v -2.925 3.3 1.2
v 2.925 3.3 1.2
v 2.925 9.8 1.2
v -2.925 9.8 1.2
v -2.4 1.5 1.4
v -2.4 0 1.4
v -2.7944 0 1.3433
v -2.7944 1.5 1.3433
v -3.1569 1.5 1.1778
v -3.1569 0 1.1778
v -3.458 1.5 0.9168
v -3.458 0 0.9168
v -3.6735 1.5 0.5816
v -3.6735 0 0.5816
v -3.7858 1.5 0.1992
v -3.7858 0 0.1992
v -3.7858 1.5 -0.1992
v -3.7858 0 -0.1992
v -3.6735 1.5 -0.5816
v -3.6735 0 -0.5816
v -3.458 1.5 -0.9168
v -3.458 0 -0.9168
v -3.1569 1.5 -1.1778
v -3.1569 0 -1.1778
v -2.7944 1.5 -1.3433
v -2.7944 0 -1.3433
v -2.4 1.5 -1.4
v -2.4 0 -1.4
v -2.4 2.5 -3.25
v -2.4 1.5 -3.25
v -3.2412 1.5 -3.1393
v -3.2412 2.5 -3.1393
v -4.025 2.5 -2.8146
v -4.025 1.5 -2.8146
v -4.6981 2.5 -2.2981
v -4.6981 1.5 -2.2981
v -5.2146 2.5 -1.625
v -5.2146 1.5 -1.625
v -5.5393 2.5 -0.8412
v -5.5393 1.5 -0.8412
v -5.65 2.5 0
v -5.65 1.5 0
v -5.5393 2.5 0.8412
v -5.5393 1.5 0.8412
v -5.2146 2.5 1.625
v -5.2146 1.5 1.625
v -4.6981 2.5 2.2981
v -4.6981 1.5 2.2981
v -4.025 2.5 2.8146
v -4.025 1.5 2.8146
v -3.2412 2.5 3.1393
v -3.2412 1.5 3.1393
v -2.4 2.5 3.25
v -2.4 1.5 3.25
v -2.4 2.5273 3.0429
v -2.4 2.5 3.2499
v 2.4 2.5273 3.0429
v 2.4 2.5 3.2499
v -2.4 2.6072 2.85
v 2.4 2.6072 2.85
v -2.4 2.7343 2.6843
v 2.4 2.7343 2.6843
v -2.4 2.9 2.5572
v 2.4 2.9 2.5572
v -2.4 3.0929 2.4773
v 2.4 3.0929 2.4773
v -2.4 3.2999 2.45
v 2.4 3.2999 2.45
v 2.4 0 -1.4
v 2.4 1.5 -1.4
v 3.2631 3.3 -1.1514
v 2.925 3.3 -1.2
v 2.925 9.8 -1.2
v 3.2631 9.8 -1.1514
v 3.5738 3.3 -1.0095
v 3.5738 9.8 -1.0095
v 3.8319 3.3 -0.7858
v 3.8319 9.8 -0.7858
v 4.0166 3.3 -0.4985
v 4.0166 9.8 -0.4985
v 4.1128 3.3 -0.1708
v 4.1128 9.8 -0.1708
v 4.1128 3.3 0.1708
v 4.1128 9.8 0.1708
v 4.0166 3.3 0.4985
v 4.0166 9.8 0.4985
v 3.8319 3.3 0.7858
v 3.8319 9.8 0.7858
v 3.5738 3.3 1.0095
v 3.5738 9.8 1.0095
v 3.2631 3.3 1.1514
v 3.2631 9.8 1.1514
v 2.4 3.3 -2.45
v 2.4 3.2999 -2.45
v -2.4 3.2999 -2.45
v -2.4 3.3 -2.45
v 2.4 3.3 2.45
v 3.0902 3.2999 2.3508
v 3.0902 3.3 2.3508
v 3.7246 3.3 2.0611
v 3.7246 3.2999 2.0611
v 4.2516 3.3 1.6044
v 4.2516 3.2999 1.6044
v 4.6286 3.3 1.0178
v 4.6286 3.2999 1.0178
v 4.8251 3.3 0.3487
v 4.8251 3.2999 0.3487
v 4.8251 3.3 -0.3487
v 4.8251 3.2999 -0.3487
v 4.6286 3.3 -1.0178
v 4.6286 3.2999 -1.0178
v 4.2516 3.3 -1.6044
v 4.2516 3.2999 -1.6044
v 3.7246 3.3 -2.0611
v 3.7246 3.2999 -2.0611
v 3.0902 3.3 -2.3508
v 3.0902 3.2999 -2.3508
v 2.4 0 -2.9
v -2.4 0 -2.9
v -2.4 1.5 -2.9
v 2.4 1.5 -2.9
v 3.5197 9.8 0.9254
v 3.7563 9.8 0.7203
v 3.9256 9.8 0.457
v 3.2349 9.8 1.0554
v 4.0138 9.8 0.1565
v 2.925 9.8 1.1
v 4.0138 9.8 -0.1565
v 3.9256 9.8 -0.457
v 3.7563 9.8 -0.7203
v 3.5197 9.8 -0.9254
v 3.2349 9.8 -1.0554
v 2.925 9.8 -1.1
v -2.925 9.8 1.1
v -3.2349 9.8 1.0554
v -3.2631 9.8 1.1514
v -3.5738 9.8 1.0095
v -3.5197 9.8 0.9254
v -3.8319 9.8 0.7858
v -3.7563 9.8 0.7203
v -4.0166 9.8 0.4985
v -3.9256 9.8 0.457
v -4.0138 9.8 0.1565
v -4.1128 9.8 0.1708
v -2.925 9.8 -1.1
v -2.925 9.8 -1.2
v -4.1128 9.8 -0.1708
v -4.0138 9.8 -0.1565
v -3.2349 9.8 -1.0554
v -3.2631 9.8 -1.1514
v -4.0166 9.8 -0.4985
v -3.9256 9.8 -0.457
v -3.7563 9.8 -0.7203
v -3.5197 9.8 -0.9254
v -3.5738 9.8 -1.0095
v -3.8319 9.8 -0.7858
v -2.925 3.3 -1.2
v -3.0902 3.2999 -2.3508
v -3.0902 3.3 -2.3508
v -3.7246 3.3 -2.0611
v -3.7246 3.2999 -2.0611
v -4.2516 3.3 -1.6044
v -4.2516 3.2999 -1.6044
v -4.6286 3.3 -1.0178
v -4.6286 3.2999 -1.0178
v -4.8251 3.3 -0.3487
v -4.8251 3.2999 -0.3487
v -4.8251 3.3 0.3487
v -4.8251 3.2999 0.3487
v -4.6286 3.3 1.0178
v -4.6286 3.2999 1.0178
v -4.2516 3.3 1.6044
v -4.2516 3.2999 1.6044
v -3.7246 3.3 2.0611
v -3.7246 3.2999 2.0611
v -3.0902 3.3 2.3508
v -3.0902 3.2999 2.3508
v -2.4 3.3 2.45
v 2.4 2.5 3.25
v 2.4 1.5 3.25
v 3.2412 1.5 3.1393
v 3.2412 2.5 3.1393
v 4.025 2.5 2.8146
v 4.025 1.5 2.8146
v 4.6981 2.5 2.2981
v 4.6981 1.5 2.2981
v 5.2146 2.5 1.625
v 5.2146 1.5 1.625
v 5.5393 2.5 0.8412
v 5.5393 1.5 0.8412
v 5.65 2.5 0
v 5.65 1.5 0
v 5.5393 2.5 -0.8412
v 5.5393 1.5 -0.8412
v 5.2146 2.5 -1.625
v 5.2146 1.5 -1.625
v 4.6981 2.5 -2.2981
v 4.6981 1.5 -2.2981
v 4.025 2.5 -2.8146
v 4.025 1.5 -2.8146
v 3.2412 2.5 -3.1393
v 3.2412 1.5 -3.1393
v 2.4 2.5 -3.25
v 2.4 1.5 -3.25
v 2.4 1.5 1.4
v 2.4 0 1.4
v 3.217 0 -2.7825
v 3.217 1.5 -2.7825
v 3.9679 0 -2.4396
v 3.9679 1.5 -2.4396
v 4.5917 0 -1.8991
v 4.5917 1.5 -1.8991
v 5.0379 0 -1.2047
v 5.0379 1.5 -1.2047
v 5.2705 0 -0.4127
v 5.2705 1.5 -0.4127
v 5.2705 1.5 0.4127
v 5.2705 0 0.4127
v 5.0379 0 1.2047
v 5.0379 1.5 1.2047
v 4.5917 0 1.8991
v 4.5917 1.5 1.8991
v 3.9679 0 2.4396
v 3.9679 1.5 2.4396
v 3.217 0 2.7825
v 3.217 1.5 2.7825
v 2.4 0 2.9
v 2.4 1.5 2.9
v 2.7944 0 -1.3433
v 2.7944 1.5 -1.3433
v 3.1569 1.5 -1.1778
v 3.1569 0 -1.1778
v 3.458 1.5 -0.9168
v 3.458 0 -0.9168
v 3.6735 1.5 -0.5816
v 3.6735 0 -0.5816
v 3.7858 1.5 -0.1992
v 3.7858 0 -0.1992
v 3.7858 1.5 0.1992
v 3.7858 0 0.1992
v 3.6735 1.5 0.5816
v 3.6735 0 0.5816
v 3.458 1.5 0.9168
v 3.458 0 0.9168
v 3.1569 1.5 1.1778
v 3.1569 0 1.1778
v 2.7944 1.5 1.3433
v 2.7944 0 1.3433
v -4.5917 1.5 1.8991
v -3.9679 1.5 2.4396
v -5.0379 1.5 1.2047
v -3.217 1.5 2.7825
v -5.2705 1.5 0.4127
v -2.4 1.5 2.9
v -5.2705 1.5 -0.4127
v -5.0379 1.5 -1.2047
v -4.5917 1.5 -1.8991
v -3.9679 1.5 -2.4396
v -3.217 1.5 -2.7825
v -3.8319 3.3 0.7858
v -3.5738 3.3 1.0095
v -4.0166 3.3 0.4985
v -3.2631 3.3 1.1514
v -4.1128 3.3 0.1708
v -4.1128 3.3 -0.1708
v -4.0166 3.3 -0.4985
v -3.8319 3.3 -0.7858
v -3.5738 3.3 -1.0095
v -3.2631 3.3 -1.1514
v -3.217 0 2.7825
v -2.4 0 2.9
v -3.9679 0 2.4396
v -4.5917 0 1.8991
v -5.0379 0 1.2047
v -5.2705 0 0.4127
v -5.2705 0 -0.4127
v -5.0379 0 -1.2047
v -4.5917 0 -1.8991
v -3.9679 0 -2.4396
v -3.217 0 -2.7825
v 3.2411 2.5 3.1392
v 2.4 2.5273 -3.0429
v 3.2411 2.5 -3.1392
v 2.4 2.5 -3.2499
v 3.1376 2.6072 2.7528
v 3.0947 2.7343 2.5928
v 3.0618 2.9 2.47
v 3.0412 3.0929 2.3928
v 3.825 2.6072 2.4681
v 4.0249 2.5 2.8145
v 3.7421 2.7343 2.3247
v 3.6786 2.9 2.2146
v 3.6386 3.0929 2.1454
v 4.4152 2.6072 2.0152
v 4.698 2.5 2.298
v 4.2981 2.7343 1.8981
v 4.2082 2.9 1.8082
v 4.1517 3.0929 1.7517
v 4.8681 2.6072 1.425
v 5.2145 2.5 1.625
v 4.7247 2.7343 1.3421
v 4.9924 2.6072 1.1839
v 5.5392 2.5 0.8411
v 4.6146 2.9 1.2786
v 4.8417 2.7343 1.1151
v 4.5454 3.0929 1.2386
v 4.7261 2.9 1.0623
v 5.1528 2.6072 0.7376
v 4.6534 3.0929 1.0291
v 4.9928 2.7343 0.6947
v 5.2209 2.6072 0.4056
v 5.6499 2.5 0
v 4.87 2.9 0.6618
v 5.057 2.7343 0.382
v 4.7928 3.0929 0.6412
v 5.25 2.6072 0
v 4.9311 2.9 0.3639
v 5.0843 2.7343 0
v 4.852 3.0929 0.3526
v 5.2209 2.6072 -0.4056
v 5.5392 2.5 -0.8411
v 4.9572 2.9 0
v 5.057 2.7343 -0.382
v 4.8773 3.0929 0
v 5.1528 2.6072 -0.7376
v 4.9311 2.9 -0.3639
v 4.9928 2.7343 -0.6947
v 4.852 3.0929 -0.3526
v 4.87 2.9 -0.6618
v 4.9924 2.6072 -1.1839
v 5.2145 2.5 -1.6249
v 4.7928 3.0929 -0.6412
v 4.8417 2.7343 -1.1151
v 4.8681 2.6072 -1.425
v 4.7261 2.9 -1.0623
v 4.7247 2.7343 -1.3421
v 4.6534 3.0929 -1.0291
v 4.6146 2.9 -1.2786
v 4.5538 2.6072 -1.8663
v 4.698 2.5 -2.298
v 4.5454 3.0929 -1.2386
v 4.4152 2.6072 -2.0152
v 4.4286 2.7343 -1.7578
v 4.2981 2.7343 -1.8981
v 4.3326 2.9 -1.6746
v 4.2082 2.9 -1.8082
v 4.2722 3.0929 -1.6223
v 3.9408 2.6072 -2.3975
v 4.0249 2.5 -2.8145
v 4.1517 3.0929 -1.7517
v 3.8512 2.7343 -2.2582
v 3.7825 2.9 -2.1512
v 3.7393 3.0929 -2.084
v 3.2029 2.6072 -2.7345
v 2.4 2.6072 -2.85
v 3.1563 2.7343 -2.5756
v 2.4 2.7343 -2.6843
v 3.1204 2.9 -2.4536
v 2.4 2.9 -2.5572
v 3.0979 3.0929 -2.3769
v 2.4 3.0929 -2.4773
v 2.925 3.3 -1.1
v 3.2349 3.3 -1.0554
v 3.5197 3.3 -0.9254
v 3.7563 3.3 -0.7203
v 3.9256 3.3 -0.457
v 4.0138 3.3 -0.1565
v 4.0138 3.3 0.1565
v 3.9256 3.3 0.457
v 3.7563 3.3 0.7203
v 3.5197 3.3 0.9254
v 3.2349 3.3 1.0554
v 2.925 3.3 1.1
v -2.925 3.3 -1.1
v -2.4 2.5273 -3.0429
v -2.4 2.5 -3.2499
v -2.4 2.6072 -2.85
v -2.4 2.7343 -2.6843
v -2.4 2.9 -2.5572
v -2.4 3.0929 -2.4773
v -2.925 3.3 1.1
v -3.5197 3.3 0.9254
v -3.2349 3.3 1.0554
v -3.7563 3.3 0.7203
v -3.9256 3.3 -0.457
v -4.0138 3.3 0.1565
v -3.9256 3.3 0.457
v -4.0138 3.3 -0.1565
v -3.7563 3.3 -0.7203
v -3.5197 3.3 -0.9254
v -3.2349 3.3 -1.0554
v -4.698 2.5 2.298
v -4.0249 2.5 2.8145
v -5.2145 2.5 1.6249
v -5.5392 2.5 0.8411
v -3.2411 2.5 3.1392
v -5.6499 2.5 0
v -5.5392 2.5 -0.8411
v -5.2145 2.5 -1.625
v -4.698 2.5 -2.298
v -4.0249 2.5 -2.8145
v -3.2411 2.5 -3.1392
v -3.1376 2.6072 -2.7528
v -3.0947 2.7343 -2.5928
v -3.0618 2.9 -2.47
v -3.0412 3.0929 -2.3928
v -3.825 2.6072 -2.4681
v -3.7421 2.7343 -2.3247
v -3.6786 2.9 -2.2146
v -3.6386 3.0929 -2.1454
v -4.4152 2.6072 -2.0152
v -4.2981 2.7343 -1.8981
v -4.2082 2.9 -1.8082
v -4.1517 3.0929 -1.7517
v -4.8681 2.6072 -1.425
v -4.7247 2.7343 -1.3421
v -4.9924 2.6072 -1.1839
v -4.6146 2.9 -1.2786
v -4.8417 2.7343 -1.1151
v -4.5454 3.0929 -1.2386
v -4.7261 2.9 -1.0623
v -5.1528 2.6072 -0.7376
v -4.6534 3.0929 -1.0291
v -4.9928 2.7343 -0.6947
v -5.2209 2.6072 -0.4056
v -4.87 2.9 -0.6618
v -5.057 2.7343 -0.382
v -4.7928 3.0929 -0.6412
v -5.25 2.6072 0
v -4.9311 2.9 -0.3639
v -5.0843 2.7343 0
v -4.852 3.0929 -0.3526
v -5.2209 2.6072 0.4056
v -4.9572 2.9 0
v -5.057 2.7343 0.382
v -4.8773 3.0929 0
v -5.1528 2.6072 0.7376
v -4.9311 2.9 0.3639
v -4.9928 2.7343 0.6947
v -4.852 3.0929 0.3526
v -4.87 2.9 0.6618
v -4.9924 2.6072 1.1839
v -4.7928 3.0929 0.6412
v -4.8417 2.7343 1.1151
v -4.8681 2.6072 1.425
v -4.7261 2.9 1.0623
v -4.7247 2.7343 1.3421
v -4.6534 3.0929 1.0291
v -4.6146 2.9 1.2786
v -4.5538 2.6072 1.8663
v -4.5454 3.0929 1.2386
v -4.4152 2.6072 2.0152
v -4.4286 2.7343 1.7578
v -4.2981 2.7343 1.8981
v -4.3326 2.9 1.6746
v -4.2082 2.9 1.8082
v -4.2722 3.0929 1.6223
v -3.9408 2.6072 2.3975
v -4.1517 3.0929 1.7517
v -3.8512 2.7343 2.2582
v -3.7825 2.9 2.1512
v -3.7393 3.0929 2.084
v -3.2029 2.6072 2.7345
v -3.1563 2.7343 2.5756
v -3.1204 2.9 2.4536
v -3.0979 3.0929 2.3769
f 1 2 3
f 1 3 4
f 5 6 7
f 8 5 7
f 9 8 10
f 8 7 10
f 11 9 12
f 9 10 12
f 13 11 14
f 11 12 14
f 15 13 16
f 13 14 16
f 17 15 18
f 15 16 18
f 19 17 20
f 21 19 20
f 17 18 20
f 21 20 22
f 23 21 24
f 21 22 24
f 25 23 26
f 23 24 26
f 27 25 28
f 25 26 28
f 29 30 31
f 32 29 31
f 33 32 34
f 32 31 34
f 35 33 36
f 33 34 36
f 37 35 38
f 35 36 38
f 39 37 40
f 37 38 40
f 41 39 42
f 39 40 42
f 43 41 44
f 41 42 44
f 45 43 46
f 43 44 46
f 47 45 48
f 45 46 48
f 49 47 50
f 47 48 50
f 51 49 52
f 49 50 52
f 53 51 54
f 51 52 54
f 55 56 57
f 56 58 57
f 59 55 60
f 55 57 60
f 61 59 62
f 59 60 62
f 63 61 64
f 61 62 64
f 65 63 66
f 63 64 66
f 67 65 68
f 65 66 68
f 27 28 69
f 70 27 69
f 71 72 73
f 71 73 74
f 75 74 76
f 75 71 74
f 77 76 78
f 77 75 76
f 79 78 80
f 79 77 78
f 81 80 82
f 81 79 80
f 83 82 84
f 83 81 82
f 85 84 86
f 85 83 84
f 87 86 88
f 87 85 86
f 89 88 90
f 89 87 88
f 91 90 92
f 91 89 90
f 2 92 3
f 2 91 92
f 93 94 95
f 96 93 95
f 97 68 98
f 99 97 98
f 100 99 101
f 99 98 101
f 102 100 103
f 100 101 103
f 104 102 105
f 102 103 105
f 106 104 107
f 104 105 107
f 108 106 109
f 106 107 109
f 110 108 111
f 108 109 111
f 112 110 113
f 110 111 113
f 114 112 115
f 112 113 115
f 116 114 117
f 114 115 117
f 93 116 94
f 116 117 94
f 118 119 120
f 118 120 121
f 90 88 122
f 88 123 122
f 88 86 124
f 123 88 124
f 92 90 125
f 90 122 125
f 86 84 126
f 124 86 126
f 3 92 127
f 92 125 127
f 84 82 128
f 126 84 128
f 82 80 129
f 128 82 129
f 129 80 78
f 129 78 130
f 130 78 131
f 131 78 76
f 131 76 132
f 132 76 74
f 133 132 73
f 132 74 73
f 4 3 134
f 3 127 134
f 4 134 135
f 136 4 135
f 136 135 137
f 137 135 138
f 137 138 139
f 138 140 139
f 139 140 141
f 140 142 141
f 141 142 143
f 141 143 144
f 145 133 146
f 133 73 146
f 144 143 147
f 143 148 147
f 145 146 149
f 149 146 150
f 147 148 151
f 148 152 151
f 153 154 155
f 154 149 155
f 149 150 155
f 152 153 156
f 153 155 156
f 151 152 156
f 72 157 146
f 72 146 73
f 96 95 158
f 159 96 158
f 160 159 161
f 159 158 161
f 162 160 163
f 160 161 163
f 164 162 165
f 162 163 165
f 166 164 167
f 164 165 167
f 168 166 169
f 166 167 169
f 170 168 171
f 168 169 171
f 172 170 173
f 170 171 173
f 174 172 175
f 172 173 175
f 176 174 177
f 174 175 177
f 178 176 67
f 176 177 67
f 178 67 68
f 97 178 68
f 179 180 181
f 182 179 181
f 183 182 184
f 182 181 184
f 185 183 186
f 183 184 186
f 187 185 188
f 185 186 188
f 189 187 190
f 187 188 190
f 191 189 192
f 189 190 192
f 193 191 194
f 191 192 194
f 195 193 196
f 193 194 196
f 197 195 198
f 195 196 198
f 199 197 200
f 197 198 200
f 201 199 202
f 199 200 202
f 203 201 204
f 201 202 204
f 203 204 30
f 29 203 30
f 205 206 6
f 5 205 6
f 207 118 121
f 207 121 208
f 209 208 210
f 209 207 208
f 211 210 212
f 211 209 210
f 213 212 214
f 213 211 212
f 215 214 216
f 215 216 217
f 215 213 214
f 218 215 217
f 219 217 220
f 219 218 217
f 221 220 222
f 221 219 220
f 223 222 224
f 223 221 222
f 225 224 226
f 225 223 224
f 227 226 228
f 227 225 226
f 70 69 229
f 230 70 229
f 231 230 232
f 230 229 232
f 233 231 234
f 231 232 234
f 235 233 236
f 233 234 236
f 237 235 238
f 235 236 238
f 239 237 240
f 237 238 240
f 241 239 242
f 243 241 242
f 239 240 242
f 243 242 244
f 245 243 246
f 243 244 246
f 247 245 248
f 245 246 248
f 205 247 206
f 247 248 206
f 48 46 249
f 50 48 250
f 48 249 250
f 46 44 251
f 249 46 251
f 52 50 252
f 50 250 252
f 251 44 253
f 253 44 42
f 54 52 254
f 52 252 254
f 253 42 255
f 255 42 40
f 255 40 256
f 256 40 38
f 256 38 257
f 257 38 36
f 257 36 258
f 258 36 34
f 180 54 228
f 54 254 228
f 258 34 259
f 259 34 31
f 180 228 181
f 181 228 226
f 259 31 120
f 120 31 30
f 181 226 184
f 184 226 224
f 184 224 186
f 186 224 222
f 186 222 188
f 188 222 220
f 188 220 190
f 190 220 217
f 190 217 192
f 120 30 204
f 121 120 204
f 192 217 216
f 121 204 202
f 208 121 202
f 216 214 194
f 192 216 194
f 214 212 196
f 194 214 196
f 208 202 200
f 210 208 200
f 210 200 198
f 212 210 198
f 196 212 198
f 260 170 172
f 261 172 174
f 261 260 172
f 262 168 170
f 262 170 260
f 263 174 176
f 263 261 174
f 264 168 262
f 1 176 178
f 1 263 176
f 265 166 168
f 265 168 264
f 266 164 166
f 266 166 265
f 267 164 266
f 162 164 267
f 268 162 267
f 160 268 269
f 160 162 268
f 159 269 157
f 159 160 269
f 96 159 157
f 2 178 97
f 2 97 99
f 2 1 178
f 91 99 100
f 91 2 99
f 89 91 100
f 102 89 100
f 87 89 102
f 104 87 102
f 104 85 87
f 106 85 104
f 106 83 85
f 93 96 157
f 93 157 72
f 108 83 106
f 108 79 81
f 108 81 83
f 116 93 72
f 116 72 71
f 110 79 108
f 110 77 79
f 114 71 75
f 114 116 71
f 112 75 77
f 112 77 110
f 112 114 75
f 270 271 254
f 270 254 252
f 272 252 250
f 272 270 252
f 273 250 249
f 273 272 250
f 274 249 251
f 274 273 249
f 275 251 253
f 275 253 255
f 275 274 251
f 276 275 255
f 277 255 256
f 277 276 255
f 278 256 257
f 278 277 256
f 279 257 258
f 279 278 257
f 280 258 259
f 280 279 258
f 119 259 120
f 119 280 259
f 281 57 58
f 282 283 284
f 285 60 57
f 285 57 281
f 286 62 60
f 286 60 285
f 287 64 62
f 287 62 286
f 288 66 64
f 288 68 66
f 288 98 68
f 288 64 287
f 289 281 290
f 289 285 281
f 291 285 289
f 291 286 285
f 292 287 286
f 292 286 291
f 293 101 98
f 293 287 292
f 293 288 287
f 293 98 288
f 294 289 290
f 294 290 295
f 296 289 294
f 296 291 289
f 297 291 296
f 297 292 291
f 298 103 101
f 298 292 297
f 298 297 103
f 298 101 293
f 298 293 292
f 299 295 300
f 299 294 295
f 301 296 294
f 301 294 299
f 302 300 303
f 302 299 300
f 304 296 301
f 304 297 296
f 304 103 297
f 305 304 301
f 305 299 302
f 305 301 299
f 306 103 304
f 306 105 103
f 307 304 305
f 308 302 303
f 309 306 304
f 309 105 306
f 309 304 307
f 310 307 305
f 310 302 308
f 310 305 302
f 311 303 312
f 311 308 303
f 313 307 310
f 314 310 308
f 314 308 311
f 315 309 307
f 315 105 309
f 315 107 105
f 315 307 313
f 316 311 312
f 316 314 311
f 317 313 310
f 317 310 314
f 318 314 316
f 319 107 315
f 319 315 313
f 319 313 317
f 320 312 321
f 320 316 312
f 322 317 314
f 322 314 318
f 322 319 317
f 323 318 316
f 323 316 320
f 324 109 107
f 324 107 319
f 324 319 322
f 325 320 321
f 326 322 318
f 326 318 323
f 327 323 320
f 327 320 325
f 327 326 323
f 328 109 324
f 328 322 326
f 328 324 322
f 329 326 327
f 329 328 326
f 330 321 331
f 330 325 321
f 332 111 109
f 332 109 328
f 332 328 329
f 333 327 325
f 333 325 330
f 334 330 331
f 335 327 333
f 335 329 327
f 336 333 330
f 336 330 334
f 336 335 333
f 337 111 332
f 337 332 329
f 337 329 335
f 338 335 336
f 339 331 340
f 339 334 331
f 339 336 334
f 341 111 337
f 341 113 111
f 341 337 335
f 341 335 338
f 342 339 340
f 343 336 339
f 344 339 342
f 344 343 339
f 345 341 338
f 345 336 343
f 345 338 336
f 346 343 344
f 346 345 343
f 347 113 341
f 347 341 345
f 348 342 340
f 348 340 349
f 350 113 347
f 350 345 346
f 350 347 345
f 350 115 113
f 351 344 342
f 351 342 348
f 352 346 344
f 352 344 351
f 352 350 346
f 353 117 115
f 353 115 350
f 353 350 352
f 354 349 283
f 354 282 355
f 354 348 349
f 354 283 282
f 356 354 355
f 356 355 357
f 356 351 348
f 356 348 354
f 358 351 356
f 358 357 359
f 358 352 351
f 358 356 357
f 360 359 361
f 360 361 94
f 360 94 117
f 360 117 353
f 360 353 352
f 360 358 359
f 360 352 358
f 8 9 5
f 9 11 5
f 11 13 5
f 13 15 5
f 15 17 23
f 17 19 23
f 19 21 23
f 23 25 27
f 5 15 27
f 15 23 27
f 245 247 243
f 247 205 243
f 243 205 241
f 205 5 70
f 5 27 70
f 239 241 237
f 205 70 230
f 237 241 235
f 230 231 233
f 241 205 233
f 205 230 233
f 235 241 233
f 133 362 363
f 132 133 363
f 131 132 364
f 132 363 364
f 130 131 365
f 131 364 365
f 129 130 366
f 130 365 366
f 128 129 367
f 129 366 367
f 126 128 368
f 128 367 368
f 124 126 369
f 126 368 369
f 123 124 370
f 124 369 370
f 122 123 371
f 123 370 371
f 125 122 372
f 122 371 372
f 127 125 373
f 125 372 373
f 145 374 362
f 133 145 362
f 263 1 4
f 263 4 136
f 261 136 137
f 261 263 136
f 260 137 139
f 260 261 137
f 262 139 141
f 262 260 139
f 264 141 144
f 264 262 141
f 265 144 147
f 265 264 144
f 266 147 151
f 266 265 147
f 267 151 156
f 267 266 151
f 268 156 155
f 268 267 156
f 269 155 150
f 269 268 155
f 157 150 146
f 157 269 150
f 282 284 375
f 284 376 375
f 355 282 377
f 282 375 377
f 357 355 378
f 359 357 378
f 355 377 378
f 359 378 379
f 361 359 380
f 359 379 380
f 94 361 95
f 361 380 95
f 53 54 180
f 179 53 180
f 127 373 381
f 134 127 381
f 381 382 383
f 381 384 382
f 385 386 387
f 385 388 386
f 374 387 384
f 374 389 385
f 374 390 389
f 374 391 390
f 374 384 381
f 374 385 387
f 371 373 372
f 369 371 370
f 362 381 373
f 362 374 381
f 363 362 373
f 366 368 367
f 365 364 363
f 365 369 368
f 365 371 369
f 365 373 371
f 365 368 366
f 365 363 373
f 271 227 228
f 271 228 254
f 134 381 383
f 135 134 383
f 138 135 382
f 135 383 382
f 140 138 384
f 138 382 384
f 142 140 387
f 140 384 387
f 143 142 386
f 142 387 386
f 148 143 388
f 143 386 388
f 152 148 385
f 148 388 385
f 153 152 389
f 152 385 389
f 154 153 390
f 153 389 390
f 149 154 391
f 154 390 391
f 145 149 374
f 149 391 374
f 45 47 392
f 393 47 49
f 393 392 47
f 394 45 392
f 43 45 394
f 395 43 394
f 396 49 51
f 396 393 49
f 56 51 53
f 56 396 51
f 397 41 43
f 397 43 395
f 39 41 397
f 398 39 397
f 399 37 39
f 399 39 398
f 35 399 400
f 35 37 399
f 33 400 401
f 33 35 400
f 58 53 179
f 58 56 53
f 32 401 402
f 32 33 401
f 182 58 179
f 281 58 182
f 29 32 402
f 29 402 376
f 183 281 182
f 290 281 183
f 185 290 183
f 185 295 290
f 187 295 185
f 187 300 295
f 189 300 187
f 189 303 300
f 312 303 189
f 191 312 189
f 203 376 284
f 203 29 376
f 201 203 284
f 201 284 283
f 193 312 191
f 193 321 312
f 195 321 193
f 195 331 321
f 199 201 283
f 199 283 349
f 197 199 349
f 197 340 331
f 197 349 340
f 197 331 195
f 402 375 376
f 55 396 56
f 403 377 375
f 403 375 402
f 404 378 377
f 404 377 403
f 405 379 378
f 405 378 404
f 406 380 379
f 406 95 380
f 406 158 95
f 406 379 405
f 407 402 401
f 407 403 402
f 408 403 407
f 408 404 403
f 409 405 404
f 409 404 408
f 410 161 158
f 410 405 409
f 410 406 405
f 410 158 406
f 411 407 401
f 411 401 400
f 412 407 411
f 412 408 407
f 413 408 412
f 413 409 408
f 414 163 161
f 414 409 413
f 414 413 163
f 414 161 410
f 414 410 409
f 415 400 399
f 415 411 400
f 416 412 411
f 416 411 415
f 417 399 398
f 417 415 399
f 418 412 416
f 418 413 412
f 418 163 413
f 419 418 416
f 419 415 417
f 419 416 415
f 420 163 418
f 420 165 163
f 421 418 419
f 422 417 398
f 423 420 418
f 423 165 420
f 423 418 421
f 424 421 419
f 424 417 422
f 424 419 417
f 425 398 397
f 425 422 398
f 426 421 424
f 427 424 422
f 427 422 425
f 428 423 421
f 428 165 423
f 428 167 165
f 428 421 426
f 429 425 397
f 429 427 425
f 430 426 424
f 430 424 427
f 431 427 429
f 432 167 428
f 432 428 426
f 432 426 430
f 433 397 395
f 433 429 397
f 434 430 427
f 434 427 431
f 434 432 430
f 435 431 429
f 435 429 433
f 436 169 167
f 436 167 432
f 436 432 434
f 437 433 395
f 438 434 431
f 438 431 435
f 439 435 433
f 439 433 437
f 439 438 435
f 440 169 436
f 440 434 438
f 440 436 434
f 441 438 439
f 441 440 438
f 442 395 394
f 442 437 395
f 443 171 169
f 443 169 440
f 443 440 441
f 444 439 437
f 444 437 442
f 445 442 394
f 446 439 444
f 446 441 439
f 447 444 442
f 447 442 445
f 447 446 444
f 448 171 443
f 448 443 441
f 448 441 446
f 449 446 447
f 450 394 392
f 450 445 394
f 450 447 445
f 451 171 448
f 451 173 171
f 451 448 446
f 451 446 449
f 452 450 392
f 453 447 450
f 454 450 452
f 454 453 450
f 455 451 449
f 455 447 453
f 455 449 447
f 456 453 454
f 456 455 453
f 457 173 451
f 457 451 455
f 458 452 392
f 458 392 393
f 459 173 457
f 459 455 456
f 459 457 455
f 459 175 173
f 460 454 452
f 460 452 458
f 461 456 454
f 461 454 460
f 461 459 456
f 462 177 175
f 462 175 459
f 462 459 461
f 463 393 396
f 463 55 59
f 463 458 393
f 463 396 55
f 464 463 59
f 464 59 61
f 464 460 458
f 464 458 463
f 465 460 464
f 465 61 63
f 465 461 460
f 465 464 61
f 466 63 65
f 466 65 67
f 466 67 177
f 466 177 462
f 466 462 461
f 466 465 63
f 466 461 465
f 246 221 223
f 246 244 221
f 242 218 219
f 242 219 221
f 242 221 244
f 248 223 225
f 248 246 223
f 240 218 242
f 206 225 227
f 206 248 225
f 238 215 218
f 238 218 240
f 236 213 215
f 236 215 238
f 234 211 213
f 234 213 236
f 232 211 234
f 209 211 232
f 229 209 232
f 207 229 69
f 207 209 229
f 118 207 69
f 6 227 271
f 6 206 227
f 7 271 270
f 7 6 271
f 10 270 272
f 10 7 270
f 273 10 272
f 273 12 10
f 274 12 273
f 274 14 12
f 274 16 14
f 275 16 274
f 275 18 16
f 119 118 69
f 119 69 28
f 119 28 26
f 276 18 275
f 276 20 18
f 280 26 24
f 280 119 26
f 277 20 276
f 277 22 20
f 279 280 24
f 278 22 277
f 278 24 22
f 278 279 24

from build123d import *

# Parameters (mm, degrees)
BOSS_EXTRUDE1_DEPTH = 1.5
BOSS_EXTRUDE2_DEPTH = 1
BOSS_EXTRUDE4_DEPTH = 0.8
BOSS_EXTRUDE3_DEPTH = 6.5
FILLET1_R           = 0.8


with BuildPart() as part:
    # Sketch1 → Boss-Extrude1 (new body)
    with BuildSketch(Plane(origin=(0, 0, 0), x_dir=(1, 0, 0), z_dir=(0, 1, 0))):
        with BuildLine():
            Line((-2.4, 2.9), (2.4, 2.9))
            ThreePointArc((2.4, 2.9), (5.3, 0), (2.4, -2.9))
            Line((2.4, -2.9), (-2.4, -2.9))
            ThreePointArc((-2.4, -2.9), (-5.3, 0), (-2.4, 2.9))
        make_face()
        with BuildLine():
            Line((-2.4, 1.4), (2.4, 1.4))
            ThreePointArc((2.4, 1.4), (3.8, 0), (2.4, -1.4))
            Line((2.4, -1.4), (-2.4, -1.4))
            ThreePointArc((-2.4, -1.4), (-3.8, 0), (-2.4, 1.4))
        make_face(mode=Mode.SUBTRACT)
    extrude(amount=BOSS_EXTRUDE1_DEPTH)

    # Sketch2 → Boss-Extrude2 (add)
    with BuildSketch(Plane(origin=(0, 1.5, 0), x_dir=(1, 0, 0), z_dir=(0, 1, 0))):
        with BuildLine():
            Line((-2.4, -3.25), (2.4, -3.25))
            ThreePointArc((2.4, -3.25), (5.65, 0), (2.4, 3.25))
            Line((2.4, 3.25), (-2.4, 3.25))
            ThreePointArc((-2.4, 3.25), (-5.65, 0), (-2.4, -3.25))
        make_face()
    extrude(amount=BOSS_EXTRUDE2_DEPTH)

    # Sketch4 → Boss-Extrude4 (add)
    with BuildSketch(Plane(origin=(0, 2.5, 0), x_dir=(1, 0, 0), z_dir=(0, 1, 0))):
        with BuildLine():
            Line((-2.4, -2.45), (2.4, -2.45))
            ThreePointArc((2.4, -2.45), (4.85, 0), (2.4, 2.45))
            Line((2.4, 2.45), (-2.4, 2.45))
            ThreePointArc((-2.4, 2.45), (-4.85, 0), (-2.4, -2.45))
        make_face()
    extrude(amount=BOSS_EXTRUDE4_DEPTH)

    # Sketch3 → Boss-Extrude3 (add)
    with BuildSketch(Plane(origin=(0, 3.3, 0), x_dir=(1, 0, 0), z_dir=(0, 1, 0))):
        with BuildLine():
            Line((-2.925, 1.2), (2.925, 1.2))
            ThreePointArc((2.925, 1.2), (4.125, 0), (2.925, -1.2))
            Line((2.925, -1.2), (-2.925, -1.2))
            ThreePointArc((-2.925, -1.2), (-4.125, 0), (-2.925, 1.2))
        make_face()
        with BuildLine():
            Line((-2.925, 1.1), (2.925, 1.1))
            ThreePointArc((2.925, 1.1), (4.025, 0), (2.925, -1.1))
            Line((2.925, -1.1), (-2.925, -1.1))
            ThreePointArc((-2.925, -1.1), (-4.025, 0), (-2.925, 1.1))
        make_face(mode=Mode.SUBTRACT)
    extrude(amount=BOSS_EXTRUDE3_DEPTH)

    # Fillet1
    fillet1_edges = [part.edges().sort_by_distance(p)[0] for p in [
        (-4.85, 2.5, 0),
        (0, 2.5, -2.45),
        (4.85, 2.5, 0),
        (0, 2.5, 2.45),
    ]]
    fillet(fillet1_edges, radius=FILLET1_R - 0.0001)  # a hair under: the kernel refuses the full size


solid = part.part
